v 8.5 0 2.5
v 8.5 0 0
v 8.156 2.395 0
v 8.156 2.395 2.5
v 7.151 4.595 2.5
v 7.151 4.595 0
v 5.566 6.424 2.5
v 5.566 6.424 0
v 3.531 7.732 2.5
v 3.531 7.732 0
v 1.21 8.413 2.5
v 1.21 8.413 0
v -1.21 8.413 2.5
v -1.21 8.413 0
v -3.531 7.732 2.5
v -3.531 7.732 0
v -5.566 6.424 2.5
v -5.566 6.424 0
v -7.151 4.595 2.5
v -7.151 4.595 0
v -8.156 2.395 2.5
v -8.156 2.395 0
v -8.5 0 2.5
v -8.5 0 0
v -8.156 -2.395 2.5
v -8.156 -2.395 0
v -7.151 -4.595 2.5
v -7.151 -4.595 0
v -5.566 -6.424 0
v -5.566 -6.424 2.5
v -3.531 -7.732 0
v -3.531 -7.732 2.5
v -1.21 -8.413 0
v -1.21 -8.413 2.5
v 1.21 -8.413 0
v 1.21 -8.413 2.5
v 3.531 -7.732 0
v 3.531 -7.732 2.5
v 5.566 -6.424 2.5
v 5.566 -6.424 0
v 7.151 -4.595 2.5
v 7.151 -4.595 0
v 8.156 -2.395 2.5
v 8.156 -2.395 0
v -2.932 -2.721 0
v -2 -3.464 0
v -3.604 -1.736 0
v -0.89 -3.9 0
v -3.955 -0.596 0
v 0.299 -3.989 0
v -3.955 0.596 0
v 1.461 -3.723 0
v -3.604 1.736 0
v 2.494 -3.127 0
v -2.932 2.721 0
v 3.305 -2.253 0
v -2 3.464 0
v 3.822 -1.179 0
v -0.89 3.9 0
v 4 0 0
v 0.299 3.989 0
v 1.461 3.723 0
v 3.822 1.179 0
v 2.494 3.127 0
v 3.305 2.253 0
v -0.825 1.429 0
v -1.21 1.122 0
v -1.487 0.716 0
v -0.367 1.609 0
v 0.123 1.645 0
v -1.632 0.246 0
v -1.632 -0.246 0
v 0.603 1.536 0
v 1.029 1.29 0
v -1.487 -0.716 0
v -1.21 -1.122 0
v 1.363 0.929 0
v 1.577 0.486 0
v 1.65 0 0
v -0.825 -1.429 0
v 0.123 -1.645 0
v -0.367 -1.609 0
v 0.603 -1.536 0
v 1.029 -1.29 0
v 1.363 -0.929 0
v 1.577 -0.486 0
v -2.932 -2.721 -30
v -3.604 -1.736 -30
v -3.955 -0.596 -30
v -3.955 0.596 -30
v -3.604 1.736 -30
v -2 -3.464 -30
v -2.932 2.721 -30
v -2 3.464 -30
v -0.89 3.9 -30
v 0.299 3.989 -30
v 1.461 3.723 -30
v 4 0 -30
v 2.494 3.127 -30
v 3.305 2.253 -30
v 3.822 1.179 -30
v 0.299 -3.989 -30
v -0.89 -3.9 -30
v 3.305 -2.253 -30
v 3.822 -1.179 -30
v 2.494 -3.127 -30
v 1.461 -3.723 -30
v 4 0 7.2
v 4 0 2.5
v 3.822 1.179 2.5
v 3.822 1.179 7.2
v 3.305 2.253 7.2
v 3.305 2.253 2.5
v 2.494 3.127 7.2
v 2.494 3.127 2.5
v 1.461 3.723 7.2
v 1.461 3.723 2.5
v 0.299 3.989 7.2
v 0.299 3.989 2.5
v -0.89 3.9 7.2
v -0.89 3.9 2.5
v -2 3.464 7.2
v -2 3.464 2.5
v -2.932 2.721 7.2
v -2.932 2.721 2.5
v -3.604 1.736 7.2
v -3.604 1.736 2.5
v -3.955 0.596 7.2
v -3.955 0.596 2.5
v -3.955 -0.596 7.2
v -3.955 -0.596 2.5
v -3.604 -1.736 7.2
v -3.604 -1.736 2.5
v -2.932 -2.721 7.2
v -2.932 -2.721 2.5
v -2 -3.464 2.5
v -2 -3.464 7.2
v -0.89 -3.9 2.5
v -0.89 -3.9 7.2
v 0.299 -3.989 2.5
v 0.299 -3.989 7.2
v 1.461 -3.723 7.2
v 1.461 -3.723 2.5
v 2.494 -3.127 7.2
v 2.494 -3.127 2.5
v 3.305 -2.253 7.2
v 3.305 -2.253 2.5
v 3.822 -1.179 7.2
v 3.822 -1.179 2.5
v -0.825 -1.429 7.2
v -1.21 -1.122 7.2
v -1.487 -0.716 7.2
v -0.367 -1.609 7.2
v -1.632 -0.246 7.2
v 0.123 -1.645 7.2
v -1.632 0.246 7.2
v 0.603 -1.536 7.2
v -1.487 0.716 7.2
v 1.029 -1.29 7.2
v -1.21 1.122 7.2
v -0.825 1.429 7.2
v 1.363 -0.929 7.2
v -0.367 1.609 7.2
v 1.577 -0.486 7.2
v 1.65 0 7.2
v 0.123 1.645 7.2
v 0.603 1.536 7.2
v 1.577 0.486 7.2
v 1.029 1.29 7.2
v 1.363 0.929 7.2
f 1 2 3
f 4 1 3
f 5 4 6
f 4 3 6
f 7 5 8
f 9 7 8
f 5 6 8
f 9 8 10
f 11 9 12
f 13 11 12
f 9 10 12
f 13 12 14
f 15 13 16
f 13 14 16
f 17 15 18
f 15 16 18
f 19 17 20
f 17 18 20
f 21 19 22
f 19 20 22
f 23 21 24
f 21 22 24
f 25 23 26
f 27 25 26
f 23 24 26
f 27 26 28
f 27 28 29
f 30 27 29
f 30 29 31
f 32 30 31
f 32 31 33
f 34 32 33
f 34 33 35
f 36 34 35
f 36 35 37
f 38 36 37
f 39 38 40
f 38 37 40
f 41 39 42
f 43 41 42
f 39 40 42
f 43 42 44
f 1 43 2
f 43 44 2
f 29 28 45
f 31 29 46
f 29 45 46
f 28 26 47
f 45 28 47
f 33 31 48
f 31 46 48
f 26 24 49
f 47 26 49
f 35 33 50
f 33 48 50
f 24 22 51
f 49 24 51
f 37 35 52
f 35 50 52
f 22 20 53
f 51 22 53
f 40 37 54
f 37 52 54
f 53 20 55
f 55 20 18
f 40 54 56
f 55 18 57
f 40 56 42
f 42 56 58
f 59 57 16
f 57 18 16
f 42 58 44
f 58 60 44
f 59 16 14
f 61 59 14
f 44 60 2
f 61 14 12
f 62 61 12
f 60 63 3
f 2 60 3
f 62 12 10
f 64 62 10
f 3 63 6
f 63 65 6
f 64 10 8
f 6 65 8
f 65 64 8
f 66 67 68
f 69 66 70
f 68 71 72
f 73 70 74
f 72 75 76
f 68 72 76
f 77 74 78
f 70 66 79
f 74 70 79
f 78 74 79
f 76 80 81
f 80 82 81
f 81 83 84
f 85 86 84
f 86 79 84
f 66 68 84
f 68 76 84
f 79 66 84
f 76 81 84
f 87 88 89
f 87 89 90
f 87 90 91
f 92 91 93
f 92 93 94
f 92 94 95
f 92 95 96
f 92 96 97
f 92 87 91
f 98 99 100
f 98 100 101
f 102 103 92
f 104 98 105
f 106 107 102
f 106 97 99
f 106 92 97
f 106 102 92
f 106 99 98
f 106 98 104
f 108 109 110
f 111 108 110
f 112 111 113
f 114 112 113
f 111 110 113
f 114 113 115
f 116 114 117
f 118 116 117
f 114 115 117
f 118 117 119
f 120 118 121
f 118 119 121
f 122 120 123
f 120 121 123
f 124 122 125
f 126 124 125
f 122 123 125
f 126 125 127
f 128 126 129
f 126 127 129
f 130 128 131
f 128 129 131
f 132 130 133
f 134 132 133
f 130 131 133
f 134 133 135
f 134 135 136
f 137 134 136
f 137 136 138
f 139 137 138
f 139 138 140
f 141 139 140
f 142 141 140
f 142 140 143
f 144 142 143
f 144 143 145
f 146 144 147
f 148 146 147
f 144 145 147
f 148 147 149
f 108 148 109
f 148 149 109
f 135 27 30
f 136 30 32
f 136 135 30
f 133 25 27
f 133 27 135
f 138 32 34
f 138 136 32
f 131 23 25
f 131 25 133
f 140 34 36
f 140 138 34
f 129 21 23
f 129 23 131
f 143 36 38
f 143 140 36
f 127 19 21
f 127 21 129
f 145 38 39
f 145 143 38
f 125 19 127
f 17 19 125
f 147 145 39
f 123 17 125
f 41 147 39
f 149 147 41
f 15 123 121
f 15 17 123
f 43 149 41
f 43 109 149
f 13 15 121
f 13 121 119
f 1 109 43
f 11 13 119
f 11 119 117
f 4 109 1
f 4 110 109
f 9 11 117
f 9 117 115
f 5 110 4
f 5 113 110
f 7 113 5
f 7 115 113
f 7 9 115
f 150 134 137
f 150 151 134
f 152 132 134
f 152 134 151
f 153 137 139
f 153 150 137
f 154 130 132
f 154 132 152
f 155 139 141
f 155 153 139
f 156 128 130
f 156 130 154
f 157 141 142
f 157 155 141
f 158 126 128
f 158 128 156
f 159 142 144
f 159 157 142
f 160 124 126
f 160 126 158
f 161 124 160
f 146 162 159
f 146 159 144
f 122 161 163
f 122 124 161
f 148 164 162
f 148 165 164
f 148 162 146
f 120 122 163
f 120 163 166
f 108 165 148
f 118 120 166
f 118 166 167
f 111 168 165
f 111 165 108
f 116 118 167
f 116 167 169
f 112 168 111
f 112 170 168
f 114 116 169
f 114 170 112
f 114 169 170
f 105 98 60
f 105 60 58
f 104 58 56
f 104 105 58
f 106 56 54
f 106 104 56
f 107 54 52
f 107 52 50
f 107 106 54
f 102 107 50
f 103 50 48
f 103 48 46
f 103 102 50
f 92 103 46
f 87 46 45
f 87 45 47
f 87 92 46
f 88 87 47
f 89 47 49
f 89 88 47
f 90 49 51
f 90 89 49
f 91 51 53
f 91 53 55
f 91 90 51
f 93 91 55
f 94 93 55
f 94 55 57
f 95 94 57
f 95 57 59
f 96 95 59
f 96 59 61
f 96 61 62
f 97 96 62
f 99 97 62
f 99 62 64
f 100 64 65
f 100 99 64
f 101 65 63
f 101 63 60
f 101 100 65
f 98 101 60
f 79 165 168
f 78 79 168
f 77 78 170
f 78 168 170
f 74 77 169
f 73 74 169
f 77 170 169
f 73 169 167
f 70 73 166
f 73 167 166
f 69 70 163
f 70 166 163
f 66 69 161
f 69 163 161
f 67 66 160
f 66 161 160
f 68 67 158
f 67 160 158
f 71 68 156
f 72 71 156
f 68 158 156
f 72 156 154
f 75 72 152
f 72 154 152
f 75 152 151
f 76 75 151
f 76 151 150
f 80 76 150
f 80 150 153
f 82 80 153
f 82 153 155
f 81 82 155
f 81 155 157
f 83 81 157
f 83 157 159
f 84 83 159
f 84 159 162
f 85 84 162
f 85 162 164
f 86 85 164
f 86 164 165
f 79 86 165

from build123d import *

# Parameters (mm, degrees)
SKETCH_1_R          = 8.5
EXTRUDE_1_DEPTH     = 2.5
SKETCH_2_R          = 4
EXTRUDE_2_DEPTH     = 4.7
SKETCH_3_R          = 1.65
CUT_EXTRUDE_1_DEPTH = 12
EXTRUDE_START       = 30
SKETCH_4_R          = 4
EXTRUDE_3_DEPTH     = 30


with BuildPart() as part:
    # Эскиз1 → Бобышка-Вытянуть1 (new body)
    with BuildSketch(Plane.XY):
        Circle(SKETCH_1_R)
    extrude(amount=EXTRUDE_1_DEPTH)

    # Эскиз2 → Бобышка-Вытянуть2 (add)
    with BuildSketch(Plane.XY.offset(2.5)):
        Circle(SKETCH_2_R)
    extrude(amount=EXTRUDE_2_DEPTH)

    # Эскиз3 → Вырез-Вытянуть1 (cut)
    with BuildSketch(Plane.XY.offset(7.2)):
        Circle(SKETCH_3_R)
    extrude(amount=-CUT_EXTRUDE_1_DEPTH, mode=Mode.SUBTRACT)

    # Эскиз4 → Бобышка-Вытянуть3 (add)
    with BuildSketch(Plane(origin=(0, 0, 0), x_dir=(-1, 0, 0), z_dir=(0, 0, -1)).offset(EXTRUDE_START)):
        with Locations(Location((0, 0, 0), (0, 0, 180))):
            Circle(SKETCH_4_R)
    extrude(amount=-EXTRUDE_3_DEPTH)


solid = part.part
